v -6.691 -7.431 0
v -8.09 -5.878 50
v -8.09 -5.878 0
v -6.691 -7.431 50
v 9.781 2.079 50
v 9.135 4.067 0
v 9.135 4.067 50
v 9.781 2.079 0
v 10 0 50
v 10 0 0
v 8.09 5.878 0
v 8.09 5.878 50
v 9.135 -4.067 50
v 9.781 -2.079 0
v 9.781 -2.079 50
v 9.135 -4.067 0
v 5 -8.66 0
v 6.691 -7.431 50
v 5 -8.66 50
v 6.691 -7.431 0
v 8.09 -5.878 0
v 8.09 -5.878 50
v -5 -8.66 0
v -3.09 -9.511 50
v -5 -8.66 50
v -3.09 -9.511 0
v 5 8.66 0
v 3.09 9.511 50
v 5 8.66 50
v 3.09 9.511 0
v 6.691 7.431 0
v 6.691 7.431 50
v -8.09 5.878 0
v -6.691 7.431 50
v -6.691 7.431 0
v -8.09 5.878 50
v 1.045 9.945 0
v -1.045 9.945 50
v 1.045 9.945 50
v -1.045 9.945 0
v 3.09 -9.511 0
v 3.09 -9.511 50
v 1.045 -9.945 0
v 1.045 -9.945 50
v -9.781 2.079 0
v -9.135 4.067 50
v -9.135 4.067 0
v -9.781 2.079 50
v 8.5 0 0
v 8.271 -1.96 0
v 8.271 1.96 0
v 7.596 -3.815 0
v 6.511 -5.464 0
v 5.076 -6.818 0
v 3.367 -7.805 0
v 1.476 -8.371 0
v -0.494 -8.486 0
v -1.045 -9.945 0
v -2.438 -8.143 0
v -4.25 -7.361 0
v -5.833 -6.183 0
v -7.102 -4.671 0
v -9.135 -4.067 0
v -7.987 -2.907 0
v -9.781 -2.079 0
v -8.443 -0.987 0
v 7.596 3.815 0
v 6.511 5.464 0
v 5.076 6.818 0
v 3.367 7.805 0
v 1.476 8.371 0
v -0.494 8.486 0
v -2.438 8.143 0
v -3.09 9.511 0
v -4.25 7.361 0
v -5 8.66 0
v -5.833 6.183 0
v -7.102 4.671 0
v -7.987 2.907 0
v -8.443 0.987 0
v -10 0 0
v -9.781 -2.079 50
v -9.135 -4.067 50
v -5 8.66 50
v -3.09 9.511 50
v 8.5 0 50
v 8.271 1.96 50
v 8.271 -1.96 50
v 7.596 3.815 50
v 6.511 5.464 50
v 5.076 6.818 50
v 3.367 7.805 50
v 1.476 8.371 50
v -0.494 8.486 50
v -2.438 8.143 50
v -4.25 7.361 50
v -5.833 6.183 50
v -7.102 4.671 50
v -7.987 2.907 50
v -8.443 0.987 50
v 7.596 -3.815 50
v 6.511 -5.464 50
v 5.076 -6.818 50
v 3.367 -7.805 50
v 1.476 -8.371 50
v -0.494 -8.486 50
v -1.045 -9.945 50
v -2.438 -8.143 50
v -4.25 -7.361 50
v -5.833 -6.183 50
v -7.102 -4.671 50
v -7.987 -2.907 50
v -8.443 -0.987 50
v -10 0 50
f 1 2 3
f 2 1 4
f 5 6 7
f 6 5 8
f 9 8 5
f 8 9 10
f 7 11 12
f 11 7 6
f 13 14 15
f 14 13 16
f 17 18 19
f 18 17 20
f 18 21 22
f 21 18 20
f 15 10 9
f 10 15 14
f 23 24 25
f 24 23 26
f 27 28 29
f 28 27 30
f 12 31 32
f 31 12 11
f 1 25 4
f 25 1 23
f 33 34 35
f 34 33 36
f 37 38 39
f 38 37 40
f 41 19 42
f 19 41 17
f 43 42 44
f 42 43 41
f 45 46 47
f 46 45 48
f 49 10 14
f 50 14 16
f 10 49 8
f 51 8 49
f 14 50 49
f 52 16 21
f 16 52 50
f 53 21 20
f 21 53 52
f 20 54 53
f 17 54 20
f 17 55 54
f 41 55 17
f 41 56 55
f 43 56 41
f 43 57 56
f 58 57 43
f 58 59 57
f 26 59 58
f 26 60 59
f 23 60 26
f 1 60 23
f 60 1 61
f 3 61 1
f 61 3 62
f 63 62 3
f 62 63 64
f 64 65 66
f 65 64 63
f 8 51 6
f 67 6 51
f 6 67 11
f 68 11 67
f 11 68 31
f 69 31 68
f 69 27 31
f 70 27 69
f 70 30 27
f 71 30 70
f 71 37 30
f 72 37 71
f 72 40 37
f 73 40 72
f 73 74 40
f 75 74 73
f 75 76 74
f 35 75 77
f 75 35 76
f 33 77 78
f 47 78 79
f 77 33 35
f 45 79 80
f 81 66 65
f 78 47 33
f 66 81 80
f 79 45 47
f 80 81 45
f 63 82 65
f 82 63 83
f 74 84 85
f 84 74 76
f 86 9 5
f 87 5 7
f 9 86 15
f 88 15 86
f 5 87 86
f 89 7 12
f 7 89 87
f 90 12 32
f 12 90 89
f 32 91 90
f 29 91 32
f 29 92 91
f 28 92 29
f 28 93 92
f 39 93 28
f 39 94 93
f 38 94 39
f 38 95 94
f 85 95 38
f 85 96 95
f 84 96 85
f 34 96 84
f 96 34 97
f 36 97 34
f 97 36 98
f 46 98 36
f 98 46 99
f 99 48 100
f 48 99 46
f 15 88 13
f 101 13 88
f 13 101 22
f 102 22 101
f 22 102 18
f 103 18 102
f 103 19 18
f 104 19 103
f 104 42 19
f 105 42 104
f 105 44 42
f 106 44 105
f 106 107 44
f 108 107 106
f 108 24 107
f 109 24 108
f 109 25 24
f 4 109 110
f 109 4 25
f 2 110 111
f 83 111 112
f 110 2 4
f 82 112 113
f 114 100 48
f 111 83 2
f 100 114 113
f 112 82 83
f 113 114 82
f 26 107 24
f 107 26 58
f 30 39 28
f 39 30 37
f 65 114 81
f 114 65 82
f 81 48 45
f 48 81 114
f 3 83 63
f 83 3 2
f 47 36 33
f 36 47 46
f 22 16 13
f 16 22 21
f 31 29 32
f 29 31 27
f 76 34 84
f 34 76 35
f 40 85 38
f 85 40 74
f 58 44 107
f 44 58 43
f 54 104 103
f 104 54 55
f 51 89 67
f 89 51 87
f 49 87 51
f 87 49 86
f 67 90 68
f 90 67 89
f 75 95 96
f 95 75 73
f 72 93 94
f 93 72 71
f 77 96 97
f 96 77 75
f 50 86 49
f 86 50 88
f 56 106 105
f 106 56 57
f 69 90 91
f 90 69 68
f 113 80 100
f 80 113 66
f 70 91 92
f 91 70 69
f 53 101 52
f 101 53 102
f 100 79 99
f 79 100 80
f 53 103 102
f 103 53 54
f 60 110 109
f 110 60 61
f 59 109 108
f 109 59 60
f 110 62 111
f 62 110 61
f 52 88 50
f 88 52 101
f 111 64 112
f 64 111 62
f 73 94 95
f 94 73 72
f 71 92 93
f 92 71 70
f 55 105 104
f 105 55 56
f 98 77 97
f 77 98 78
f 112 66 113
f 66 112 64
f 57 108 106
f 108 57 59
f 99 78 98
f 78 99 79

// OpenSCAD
module tube(outer_dia, inner_dia, height) {
    difference() {
        cylinder(d=outer_dia, h=height);
        cylinder(d=inner_dia, h=height);
    }
}

tube(20, 17, 50);
